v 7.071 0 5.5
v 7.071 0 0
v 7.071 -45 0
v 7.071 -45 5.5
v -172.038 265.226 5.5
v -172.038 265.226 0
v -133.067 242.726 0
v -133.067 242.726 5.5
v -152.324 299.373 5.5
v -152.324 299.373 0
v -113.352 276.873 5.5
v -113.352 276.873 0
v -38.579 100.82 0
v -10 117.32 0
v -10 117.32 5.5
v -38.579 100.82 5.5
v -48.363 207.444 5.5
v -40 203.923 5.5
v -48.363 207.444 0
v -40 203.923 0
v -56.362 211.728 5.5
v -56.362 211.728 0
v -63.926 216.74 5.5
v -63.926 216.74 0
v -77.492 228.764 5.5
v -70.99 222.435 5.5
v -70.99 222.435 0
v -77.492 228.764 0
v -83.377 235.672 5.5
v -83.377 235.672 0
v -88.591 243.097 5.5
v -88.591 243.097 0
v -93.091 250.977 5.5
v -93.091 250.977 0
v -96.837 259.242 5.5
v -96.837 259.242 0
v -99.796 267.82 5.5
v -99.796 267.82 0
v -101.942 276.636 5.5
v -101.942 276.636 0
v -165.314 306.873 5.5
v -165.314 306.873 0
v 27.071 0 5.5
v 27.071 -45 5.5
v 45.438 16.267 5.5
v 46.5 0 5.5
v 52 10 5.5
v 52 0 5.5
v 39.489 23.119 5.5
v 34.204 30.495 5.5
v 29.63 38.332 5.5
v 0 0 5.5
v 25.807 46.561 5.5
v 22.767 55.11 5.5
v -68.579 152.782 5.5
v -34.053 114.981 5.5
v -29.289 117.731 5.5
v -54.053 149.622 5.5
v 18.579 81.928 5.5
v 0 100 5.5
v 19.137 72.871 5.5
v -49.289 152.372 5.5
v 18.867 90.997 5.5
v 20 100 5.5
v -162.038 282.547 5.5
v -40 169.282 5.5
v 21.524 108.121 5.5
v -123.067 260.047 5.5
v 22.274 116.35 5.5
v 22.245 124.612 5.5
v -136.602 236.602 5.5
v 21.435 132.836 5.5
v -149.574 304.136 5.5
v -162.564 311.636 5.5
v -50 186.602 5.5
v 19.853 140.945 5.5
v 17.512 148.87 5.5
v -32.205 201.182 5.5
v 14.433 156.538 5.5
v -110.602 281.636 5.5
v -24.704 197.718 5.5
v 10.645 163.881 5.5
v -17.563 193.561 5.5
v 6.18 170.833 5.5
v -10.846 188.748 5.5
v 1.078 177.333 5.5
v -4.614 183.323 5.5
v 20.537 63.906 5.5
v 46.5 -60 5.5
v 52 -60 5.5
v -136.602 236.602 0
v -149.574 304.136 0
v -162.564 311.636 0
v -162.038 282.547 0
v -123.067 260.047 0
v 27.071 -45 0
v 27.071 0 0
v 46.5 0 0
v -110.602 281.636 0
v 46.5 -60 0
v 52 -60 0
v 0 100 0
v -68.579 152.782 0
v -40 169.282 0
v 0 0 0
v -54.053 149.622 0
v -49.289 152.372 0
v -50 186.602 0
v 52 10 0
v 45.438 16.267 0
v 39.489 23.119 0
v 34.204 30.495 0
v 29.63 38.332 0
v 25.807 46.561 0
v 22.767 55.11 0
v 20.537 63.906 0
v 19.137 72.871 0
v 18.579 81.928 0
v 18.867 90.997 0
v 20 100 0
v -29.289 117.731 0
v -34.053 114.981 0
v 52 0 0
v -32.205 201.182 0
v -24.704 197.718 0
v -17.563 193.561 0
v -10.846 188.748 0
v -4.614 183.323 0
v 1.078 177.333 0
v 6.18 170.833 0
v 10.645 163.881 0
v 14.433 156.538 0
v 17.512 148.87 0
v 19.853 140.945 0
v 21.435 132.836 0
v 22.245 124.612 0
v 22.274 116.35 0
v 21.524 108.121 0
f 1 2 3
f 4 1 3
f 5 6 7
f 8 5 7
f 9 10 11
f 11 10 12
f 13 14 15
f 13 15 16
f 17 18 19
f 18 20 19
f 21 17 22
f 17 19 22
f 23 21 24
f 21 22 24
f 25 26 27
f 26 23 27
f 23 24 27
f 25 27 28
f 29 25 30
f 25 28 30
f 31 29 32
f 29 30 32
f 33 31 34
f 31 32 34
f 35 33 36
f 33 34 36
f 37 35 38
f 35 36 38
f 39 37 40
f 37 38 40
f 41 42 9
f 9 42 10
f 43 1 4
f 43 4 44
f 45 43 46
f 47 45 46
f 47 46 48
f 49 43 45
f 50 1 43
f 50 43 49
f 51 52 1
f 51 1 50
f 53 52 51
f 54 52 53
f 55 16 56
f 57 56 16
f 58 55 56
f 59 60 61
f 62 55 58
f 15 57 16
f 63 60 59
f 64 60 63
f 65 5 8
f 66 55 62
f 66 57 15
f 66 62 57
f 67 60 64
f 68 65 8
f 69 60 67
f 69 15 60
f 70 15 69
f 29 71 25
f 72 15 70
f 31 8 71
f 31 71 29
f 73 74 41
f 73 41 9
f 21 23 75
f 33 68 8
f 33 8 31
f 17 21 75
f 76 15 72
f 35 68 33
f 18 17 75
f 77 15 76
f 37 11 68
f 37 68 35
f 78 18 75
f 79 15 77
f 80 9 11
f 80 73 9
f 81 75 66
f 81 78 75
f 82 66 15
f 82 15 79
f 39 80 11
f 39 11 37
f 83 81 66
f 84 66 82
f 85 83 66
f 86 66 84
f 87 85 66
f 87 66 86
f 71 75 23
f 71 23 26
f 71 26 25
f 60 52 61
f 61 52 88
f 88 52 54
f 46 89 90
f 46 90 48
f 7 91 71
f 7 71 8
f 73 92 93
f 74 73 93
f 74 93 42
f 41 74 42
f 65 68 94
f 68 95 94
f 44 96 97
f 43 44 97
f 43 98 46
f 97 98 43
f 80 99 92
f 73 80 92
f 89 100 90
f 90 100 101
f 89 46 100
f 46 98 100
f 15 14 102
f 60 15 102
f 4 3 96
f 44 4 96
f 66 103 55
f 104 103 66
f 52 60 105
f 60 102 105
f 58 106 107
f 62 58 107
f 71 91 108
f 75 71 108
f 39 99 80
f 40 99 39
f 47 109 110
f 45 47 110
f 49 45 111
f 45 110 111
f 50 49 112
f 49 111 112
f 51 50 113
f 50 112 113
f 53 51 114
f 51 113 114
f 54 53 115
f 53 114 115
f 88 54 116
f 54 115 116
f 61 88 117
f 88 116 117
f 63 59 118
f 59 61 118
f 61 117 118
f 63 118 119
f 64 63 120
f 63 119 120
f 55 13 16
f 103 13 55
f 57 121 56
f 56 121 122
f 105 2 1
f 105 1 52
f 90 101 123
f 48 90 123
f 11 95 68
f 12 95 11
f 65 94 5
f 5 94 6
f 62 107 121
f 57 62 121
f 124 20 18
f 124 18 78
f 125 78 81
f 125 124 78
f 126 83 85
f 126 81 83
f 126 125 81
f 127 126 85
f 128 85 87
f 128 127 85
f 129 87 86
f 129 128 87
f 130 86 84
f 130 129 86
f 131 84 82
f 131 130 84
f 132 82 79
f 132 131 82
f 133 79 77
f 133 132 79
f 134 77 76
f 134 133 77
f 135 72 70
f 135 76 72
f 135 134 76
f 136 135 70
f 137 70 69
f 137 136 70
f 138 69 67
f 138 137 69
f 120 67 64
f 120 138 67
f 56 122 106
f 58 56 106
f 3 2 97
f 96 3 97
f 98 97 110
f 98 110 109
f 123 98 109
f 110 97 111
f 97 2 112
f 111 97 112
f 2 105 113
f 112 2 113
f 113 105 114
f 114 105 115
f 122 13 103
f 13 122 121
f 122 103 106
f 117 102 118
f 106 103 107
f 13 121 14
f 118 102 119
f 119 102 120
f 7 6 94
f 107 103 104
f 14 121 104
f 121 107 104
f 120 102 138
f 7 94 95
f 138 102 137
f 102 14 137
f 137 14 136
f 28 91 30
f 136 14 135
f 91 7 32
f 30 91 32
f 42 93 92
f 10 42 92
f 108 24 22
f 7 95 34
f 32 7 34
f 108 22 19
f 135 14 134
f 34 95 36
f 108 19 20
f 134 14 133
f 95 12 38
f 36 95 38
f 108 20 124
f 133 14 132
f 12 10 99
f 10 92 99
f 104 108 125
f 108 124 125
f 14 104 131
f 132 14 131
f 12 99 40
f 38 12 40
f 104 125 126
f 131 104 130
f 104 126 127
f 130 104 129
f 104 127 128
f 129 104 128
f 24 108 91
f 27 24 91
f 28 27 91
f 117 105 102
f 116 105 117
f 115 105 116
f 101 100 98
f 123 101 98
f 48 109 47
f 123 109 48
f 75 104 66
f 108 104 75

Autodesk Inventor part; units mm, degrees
ref_plane "YZ Plane" through (0, 0, 0) normal (1, 0, 0) x (0, 1, 0)
ref_plane "XZ Plane" through (0, 0, 0) normal (0, 1, 0) x (-1, 0, 0)
ref_plane "XY Plane" through (0, 0, 0) normal (0, 0, 1) x (1, 0, 0)
sketch "Sketch1" plane through (0, 0, 0) normal (0, 0, 1) x (1, 0, 0)
  arc A0 (20, 100) -> (52, 10) centre (115.8042, 83.3748) ccw
  line L0 (-10, 117.3205) -> (-38.5788, 100.8205)
  line L1 (-38.5788, 100.8205) -> (-68.5788, 152.782)
  line L2 (-68.5788, 152.782) -> (-40, 169.282)
  line L3 (-29.2894, 117.7308) -> (-34.0526, 114.9808)
  line L4 (-34.0526, 114.9808) -> (-54.0526, 149.6218)
  line L5 (-54.0526, 149.6218) -> (-49.2894, 152.3718)
  line L6 (-49.2894, 152.3718) -> (-29.2894, 117.7308)
  line L7 (-136.6025, 236.6025) -> (-50, 186.6025)
  arc A1 (-101.9423, 276.6359) -> (-40, 203.923) centre (-6.4957, 295.2045) ccw
  line L8 (-136.6025, 236.6025) -> (-50, 186.6025)
  arc A2 (20, 100) -> (-40, 203.923) centre (-65.07, 120.1668) ccw
  line L9 (-10, 117.3205) -> (0, 100)
  line L10 (-40, 169.282) -> (-50, 186.6025)
  line L11 (0, 100) -> (0, 0)
  line L12 (52, 10) -> (52, 0)
  line L13 (-110.6025, 281.6359) -> (-101.9423, 276.6359)
  line L14 (46.5, 0) -> (27.071, 0)
  line L15 (7.071, 0) -> (0, 0)
  line L16 (-136.6025, 236.6025) -> (-133.067, 242.7262)
  line L17 (-136.6025, 236.6025) -> (-129.5315, 236.6025) construction
  line L18 (-123.067, 260.0467) -> (-113.3525, 276.8727)
  line L19 (7.071, 0) -> (7.071, -45)
  line L20 (7.071, -45) -> (27.071, -45)
  line L21 (27.071, -45) -> (27.071, 0)
  line L22 (46.5, 0) -> (46.5, -60)
  line L23 (46.5, -60) -> (52, -60)
  line L24 (52, -60) -> (52, 0)
  line L25 (-110.6025, 281.6359) -> (-149.5737, 304.1359)
  line L26 (-152.3237, 299.3727) -> (-113.3525, 276.8727)
  line L27 (-123.067, 260.0467) -> (-162.0382, 282.5467)
  line L28 (-162.0382, 282.5467) -> (-172.0382, 265.2262)
  line L29 (-172.0382, 265.2262) -> (-133.067, 242.7262)
  line L30 (-149.5737, 304.1359) -> (-162.5641, 311.6359)
  line L31 (-162.5641, 311.6359) -> (-165.3141, 306.8727)
  line L32 (-165.3141, 306.8727) -> (-152.3237, 299.3727)
  dimension "d9" = 33
  dimension "d10" = 60
  dimension "d11" = 5.5
  dimension "d12" = 40
  dimension "d13" = 52
  dimension "d14" = 100
  dimension "d28" = 19.429
  dimension "d34" = 60
  dimension "d39" = 19.429
  dimension "d43" = 45
  dimension "d44" = 60
extrude "Extrusion2" add sketch "Sketch1" along normal blind 5.5
properties part number "brazos"
